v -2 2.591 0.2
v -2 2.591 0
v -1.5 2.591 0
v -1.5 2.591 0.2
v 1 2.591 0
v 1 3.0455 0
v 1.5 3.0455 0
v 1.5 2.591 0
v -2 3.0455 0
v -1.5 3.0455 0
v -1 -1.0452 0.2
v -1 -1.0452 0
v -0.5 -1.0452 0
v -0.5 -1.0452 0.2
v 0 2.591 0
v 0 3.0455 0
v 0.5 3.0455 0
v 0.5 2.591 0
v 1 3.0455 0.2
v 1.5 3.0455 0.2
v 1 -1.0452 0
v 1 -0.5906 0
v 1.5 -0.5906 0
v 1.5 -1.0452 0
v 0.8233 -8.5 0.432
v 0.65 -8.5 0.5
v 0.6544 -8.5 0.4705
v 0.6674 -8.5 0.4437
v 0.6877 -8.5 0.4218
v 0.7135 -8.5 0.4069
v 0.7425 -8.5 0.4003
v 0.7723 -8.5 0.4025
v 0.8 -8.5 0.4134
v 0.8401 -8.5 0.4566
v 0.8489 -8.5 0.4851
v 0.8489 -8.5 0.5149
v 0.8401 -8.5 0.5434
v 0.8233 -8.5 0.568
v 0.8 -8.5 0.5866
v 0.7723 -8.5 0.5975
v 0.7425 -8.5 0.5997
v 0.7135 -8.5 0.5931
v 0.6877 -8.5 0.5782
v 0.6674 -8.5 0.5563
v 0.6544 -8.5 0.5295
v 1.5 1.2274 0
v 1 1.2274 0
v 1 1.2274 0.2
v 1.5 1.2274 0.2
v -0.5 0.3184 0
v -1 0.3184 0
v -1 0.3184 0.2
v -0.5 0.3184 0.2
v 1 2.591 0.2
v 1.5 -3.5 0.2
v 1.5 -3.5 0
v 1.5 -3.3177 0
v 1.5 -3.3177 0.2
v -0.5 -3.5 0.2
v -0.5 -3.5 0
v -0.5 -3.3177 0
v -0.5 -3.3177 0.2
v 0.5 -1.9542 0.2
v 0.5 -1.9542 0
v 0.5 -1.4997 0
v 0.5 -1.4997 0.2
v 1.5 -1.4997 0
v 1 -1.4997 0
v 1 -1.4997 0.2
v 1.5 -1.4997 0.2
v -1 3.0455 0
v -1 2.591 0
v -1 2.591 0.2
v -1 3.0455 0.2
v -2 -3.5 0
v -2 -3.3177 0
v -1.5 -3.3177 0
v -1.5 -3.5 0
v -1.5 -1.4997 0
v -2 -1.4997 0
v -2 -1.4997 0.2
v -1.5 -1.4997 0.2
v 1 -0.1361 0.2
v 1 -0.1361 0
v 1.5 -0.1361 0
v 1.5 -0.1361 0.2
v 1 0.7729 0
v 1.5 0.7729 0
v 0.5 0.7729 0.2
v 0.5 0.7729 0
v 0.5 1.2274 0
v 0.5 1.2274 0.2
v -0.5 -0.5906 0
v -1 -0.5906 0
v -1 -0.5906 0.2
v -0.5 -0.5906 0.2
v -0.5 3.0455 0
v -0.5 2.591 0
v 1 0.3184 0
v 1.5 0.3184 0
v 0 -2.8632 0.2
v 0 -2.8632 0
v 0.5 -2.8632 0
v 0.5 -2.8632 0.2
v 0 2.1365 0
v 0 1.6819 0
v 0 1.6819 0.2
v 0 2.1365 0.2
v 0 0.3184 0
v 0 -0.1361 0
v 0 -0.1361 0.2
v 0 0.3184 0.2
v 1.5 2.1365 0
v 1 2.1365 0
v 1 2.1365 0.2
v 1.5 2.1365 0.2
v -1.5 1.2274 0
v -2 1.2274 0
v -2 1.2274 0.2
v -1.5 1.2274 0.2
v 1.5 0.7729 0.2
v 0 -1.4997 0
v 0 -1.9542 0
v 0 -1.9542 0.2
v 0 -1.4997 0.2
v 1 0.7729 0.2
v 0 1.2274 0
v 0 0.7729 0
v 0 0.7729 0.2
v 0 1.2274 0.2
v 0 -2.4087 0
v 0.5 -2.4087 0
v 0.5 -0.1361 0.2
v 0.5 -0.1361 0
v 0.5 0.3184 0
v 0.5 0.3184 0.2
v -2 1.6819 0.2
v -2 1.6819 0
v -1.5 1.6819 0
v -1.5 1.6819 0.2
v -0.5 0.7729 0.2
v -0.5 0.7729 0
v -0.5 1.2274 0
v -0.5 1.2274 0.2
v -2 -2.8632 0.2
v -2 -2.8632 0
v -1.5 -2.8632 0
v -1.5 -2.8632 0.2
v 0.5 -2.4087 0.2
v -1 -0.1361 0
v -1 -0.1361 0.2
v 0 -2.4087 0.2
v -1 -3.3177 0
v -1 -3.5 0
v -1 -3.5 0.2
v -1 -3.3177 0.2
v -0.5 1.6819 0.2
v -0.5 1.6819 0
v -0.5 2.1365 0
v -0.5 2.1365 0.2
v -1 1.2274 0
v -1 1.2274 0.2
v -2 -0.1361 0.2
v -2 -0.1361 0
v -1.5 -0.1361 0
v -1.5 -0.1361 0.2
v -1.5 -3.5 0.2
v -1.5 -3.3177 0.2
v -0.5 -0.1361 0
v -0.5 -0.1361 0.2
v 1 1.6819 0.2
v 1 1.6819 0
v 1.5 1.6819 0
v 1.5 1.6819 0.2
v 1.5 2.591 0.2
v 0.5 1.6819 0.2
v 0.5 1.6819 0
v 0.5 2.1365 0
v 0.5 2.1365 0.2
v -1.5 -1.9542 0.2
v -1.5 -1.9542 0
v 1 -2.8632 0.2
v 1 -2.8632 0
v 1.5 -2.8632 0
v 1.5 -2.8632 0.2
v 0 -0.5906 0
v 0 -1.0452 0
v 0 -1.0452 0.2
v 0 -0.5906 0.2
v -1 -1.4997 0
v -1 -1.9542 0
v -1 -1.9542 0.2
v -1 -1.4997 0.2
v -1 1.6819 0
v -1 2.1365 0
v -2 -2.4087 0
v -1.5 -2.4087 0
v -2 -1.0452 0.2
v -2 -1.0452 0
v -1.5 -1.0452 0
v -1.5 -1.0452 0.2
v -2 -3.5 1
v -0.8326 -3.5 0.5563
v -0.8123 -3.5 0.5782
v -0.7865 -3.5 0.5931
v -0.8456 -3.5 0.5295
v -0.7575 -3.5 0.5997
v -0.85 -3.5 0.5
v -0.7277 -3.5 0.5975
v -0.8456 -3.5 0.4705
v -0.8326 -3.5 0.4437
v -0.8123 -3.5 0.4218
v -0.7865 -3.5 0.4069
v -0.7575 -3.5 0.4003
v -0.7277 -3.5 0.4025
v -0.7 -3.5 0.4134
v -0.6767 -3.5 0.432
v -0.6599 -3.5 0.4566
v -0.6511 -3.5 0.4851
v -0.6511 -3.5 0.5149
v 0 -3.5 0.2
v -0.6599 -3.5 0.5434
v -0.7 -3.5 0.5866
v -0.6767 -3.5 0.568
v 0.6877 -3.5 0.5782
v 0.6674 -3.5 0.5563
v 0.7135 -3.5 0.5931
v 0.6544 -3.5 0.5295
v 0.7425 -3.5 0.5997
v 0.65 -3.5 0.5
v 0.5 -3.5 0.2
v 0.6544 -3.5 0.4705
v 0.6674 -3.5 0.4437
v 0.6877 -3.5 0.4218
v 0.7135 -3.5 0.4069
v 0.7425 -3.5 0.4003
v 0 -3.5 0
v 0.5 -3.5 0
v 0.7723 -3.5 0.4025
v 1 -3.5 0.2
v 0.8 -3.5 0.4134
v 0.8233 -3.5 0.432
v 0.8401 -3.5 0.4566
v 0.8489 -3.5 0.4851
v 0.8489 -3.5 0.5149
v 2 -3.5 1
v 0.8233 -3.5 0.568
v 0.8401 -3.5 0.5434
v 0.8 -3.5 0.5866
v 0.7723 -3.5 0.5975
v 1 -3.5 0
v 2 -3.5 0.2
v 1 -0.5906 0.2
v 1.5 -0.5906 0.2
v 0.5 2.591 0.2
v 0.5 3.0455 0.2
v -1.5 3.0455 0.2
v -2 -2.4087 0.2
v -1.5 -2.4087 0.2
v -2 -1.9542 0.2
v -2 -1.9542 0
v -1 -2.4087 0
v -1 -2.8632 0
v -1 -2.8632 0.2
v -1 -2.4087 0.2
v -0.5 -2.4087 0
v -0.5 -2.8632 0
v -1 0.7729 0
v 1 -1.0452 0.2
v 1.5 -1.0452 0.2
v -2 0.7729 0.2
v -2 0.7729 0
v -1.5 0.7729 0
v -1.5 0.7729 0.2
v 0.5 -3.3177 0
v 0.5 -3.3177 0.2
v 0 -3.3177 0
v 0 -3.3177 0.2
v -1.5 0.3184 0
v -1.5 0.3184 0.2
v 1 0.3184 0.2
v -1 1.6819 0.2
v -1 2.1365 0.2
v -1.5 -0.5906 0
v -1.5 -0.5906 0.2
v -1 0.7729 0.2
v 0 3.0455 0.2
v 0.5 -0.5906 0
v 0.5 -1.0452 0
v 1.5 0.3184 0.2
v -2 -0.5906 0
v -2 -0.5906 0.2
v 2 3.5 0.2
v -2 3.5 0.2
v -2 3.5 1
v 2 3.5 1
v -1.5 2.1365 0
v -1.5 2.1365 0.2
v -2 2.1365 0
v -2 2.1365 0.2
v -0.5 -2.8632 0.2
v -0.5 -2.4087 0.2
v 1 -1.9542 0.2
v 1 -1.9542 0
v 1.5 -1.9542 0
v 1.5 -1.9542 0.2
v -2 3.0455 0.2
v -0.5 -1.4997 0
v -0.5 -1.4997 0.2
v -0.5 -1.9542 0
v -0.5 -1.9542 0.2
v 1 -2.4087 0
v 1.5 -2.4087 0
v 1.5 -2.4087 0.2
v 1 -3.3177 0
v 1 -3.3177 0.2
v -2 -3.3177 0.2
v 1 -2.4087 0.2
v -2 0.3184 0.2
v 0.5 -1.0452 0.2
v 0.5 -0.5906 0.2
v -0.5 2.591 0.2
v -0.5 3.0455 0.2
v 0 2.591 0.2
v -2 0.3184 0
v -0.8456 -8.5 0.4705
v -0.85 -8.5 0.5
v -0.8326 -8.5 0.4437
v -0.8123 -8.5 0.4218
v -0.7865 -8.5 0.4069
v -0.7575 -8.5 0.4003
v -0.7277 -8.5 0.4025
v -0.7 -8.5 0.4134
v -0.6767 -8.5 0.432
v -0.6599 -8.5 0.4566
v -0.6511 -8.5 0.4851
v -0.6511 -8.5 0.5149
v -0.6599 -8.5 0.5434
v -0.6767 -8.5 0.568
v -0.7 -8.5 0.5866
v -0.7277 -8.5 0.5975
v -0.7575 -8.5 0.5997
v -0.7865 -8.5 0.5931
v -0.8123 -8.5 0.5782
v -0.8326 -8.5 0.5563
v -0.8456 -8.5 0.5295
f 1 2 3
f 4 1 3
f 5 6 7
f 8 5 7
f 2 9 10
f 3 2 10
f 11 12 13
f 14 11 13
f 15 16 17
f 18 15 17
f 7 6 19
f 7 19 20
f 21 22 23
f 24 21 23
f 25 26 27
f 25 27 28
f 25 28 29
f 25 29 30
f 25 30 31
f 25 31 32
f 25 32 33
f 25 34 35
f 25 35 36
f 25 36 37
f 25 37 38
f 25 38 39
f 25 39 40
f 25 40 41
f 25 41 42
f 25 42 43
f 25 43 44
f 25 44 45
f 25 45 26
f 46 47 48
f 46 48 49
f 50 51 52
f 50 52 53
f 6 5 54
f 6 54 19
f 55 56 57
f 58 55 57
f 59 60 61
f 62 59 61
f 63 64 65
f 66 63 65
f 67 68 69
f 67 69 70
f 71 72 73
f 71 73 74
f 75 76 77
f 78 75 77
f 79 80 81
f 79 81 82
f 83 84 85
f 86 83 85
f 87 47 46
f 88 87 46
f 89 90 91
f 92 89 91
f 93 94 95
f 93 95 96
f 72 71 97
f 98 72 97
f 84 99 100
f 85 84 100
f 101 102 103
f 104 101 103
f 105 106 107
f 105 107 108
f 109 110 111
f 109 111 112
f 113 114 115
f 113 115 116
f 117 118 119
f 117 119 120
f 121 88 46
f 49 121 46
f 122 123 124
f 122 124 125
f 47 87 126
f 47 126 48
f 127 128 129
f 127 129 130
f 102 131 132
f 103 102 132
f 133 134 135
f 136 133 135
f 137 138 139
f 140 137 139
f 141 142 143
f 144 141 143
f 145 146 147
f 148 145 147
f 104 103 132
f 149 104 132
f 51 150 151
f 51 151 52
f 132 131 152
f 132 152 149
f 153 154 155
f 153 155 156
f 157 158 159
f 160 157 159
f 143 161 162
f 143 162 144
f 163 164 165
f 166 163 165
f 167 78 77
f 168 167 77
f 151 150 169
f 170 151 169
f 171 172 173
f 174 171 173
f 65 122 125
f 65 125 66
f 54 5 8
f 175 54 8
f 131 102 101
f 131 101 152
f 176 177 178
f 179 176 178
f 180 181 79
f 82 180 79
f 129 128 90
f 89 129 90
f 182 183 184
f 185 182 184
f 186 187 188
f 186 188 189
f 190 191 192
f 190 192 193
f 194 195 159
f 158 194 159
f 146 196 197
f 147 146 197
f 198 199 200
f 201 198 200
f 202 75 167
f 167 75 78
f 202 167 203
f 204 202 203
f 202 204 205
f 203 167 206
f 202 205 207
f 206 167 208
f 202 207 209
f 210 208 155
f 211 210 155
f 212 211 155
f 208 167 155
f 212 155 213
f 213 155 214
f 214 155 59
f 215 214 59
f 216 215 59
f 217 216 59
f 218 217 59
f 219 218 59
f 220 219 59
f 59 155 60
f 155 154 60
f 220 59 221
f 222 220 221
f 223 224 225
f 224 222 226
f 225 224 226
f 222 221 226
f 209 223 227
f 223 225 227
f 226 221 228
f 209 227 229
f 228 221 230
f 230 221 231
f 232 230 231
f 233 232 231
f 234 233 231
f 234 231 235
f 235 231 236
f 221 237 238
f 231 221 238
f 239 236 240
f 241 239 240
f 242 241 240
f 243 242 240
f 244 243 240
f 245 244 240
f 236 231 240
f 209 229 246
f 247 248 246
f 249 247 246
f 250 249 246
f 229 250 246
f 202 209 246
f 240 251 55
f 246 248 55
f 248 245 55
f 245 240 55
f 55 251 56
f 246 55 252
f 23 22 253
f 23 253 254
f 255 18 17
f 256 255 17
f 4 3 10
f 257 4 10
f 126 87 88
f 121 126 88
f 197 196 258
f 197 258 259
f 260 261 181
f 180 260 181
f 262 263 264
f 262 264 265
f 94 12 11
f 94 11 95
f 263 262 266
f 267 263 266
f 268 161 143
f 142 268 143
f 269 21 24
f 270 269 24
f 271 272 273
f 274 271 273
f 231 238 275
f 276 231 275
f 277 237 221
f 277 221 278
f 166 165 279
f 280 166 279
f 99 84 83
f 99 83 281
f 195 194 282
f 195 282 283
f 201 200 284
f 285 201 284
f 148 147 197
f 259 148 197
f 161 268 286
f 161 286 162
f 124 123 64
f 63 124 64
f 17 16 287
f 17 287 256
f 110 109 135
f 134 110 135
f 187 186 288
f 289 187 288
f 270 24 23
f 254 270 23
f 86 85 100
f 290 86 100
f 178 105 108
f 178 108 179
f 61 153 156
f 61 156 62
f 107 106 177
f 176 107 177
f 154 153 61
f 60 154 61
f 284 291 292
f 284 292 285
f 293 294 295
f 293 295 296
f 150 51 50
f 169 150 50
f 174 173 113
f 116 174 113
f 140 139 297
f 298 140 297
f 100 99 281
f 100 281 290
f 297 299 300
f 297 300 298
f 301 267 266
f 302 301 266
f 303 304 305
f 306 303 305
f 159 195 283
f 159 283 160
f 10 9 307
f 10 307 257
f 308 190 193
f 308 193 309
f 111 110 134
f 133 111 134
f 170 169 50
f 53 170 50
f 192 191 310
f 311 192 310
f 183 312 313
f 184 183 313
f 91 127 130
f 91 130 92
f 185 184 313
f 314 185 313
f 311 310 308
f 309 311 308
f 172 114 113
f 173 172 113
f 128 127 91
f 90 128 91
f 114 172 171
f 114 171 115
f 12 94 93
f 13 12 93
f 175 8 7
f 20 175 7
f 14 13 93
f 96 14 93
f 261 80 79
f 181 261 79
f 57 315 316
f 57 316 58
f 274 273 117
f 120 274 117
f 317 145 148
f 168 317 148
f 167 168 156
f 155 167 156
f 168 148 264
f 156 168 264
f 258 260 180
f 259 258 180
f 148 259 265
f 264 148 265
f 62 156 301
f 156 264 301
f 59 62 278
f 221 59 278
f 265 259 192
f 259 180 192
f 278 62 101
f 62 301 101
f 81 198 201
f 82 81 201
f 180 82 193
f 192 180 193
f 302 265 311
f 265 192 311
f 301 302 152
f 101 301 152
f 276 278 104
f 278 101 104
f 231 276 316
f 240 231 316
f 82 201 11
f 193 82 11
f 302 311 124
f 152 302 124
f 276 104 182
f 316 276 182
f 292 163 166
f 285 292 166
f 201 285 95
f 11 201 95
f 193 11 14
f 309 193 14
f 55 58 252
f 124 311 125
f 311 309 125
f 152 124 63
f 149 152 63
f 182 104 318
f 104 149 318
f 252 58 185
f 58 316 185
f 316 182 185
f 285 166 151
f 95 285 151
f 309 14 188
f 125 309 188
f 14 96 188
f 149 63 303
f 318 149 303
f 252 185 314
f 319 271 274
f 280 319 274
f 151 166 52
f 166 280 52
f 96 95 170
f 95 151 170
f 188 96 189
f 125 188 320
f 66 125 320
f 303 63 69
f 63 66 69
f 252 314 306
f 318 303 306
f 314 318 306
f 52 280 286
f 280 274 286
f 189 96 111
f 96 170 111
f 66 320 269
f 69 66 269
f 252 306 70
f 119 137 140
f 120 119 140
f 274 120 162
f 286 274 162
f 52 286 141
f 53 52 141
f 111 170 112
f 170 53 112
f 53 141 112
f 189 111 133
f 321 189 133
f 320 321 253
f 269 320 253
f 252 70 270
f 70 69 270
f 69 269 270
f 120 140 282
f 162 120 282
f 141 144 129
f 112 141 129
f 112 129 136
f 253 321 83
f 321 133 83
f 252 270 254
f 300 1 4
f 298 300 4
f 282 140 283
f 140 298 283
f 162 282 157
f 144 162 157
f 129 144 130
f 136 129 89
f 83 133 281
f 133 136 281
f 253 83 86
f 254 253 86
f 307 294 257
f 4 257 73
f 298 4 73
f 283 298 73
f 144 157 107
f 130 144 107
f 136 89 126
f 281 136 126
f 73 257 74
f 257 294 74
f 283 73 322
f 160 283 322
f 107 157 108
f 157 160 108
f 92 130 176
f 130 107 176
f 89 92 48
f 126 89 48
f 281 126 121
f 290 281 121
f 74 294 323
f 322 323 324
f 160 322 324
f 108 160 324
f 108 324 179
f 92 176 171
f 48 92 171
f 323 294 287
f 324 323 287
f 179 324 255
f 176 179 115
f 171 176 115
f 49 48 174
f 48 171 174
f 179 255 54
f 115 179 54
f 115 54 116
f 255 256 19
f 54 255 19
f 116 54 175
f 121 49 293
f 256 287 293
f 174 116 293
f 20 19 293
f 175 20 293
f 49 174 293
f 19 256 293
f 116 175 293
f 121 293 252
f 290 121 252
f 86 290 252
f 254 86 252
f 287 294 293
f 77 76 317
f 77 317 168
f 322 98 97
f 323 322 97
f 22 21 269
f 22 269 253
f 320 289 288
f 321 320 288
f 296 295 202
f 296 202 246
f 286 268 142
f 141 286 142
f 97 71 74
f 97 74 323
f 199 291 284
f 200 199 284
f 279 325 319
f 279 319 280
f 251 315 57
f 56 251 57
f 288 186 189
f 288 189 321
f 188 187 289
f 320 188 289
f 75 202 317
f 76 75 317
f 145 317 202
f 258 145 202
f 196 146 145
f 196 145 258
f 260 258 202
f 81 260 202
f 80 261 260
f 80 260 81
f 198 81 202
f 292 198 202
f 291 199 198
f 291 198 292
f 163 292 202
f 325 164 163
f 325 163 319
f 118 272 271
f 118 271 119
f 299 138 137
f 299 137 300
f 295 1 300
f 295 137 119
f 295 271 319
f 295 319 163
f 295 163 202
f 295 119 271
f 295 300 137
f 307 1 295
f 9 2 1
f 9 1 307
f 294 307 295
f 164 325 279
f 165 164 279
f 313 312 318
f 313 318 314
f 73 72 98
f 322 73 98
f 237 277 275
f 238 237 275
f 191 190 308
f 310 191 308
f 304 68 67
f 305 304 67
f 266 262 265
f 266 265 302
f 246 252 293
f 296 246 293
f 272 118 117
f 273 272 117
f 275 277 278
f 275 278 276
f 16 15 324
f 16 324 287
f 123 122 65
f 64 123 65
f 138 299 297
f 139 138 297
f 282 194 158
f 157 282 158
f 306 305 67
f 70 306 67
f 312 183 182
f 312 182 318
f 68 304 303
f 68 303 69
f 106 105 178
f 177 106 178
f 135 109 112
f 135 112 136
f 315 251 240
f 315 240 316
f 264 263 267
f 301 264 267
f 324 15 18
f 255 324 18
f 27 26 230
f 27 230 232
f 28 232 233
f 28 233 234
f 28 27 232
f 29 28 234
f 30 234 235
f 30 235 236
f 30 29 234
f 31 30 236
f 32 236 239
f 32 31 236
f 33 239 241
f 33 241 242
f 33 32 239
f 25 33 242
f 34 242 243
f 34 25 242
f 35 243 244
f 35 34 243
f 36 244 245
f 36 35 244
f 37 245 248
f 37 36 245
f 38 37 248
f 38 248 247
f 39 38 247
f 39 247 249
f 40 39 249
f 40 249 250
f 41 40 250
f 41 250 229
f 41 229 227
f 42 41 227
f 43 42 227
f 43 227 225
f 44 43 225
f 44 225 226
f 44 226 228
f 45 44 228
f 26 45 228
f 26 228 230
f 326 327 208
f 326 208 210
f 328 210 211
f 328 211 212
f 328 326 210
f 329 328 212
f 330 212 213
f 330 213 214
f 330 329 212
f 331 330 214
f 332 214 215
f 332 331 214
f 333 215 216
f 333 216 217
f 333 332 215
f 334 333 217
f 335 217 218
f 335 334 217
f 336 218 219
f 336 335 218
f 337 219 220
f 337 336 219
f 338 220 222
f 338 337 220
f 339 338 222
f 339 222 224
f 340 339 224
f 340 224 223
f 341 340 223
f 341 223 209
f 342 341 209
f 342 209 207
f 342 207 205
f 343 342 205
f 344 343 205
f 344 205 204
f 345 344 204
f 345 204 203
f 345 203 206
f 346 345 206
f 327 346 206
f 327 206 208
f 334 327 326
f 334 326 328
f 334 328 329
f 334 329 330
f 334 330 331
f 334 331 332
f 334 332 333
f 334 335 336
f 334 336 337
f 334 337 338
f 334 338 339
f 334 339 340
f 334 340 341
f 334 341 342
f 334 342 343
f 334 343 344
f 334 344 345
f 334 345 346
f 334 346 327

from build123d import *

# Parameters (mm, degrees)
SKETCH_1_W          = 4
SKETCH_1_H          = 7
EXTRUDE_1_DEPTH     = 1
SKETCH_2_W          = 0.5
SKETCH_2_H          = 7
CUT_EXTRUDE_2_DEPTH = 0.2
SKETCH_3_W          = 4
SKETCH_3_H          = 0.454516336
SKETCH_3_H_2        = 0.454516335
CUT_EXTRUDE_4_DEPTH = 0.2
SWEEP_1_PROFILE_R   = 0.1
SWEEP_2_PROFILE_R   = 0.1


with BuildPart() as part:
    # 草图1 → 凸台-拉伸1 (new body)
    with BuildSketch(Plane.XY):
        Rectangle(SKETCH_1_W, SKETCH_1_H)
    extrude(amount=EXTRUDE_1_DEPTH)

    # 草图2 → 切除-拉伸2 (cut)
    with BuildSketch(Plane.XY):
        with Locations((1.75, 0)):
            Rectangle(SKETCH_2_W, SKETCH_2_H)
        with Locations((0.75, 0)):
            Rectangle(SKETCH_2_W, SKETCH_2_H)
        with Locations((-0.25, 0)):
            Rectangle(SKETCH_2_W, SKETCH_2_H)
        with Locations((-1.25, 0)):
            Rectangle(SKETCH_2_W, SKETCH_2_H)
    extrude(amount=CUT_EXTRUDE_2_DEPTH, mode=Mode.SUBTRACT)

    # 草图3 → 切除-拉伸4 (cut)
    with BuildSketch(Plane.XY):
        with Locations((0, 3.272741832)):
            Rectangle(SKETCH_3_W, SKETCH_3_H)
        with Locations((0, 2.363709161)):
            Rectangle(SKETCH_3_W, SKETCH_3_H)
        with Locations((0, 1.45467649)):
            Rectangle(SKETCH_3_W, SKETCH_3_H_2)
        with Locations((0, 0.545643818)):
            Rectangle(SKETCH_3_W, SKETCH_3_H)
        with Locations((0, -0.363388853)):
            Rectangle(SKETCH_3_W, SKETCH_3_H)
        with Locations((0, -1.272421525)):
            Rectangle(SKETCH_3_W, SKETCH_3_H)
        with Locations((0, -2.181454196)):
            Rectangle(SKETCH_3_W, SKETCH_3_H)
        with Locations((0, -3.090486868)):
            Rectangle(SKETCH_3_W, SKETCH_3_H_2)
    extrude(amount=CUT_EXTRUDE_4_DEPTH, mode=Mode.SUBTRACT)

    # 扫描1: sweep along a path in 草图4
    with BuildLine(Plane.XY.offset(0.5)) as sweep_1_path:
        Line((-0.75, -3.5), (-0.75, -8.5))
    # 扫描1 profile (on start of the path) → 扫描1 (sweep)
    with BuildSketch(Plane(origin=(-0.75, -3.5, 0.5), x_dir=(-1, 0, 0), z_dir=(0, -1, 0))):
        Circle(SWEEP_1_PROFILE_R)
    sweep(path=sweep_1_path.line)

    # 扫描2: sweep along a path in 草图11
    with BuildLine(Plane.XY.offset(0.5)) as sweep_2_path:
        Line((0.75, -3.5), (0.75, -8.5))
    # 扫描2 profile (on start of the path) → 扫描2 (sweep)
    with BuildSketch(Plane(origin=(0.75, -3.5, 0.5), x_dir=(-1, 0, 0), z_dir=(0, -1, 0))):
        Circle(SWEEP_2_PROFILE_R)
    sweep(path=sweep_2_path.line)


solid = part.part
